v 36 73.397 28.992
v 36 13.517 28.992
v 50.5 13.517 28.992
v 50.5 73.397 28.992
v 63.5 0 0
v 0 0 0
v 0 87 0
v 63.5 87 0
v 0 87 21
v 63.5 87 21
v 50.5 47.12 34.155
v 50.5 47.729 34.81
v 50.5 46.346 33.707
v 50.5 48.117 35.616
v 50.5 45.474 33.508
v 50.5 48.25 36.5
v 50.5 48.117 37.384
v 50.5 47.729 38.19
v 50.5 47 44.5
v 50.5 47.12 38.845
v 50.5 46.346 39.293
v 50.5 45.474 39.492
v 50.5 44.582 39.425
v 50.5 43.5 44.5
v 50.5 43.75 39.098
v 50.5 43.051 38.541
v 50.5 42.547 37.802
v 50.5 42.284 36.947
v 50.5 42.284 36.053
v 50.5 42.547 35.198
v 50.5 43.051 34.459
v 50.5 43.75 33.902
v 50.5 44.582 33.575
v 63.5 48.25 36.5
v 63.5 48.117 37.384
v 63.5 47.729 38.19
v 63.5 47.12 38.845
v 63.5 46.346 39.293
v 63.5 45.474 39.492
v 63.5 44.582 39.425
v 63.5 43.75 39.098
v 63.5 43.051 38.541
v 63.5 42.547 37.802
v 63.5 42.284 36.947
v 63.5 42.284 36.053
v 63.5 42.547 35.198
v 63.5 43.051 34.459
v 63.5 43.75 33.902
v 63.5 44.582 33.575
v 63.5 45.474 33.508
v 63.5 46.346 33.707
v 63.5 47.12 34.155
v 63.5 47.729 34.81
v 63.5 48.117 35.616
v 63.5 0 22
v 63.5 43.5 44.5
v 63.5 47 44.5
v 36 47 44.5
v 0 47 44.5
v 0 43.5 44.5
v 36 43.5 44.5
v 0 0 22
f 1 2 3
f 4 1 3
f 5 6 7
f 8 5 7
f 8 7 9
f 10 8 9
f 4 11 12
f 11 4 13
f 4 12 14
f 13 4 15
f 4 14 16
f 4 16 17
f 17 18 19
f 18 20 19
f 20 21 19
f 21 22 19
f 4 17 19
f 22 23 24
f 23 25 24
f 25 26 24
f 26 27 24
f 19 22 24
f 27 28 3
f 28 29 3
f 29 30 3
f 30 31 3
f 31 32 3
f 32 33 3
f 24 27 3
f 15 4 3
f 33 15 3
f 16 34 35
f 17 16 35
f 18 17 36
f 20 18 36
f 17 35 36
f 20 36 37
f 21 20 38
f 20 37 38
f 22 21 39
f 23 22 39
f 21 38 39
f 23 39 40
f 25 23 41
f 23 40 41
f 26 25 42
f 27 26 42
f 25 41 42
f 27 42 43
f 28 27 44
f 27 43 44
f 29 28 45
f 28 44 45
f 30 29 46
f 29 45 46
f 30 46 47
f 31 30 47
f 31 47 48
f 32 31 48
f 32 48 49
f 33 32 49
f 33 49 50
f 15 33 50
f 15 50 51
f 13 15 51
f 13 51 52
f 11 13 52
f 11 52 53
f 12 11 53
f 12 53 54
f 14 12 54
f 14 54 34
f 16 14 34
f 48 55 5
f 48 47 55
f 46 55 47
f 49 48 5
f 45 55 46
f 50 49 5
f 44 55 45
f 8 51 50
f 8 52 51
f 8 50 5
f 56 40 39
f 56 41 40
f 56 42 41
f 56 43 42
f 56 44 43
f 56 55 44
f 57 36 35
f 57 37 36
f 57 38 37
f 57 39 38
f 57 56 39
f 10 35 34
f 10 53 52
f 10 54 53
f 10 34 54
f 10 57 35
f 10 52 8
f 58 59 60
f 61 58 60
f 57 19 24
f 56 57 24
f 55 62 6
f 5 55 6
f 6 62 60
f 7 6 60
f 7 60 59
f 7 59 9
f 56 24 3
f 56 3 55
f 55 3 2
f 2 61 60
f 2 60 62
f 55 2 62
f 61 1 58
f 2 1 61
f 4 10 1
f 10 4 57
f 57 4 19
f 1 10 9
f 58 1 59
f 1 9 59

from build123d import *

# Parameters (mm, degrees)
F1_DEPTH = 63.5
F2_W     = 14.5
F2_H     = 23.934039
F3_DEPTH = 100
F4_R     = 3
F5_DEPTH = 25


with BuildPart() as f1:
    # F0 (on Right) → F1 (new body)
    with BuildSketch(Plane.YZ):
        Polygon((0, 22), (0, 0), (87, 0), (87, 21), (47, 44.5), (43.5, 44.5), align=None)
    extrude(amount=F1_DEPTH)

    # F2 (on face) → F3 (cut)
    with BuildSketch(Plane.XZ):
        with Locations((43.25, 40.958737)):
            Rectangle(F2_W, F2_H)
    extrude(amount=-F3_DEPTH, mode=Mode.SUBTRACT)

    # F4 (on face) → F5 (cut)
    with BuildSketch(Plane.YZ.offset(63.5)):
        with Locations((45.25, 36.5)):
            Circle(F4_R)
    extrude(amount=-F5_DEPTH, mode=Mode.SUBTRACT)


solid = f1.part
